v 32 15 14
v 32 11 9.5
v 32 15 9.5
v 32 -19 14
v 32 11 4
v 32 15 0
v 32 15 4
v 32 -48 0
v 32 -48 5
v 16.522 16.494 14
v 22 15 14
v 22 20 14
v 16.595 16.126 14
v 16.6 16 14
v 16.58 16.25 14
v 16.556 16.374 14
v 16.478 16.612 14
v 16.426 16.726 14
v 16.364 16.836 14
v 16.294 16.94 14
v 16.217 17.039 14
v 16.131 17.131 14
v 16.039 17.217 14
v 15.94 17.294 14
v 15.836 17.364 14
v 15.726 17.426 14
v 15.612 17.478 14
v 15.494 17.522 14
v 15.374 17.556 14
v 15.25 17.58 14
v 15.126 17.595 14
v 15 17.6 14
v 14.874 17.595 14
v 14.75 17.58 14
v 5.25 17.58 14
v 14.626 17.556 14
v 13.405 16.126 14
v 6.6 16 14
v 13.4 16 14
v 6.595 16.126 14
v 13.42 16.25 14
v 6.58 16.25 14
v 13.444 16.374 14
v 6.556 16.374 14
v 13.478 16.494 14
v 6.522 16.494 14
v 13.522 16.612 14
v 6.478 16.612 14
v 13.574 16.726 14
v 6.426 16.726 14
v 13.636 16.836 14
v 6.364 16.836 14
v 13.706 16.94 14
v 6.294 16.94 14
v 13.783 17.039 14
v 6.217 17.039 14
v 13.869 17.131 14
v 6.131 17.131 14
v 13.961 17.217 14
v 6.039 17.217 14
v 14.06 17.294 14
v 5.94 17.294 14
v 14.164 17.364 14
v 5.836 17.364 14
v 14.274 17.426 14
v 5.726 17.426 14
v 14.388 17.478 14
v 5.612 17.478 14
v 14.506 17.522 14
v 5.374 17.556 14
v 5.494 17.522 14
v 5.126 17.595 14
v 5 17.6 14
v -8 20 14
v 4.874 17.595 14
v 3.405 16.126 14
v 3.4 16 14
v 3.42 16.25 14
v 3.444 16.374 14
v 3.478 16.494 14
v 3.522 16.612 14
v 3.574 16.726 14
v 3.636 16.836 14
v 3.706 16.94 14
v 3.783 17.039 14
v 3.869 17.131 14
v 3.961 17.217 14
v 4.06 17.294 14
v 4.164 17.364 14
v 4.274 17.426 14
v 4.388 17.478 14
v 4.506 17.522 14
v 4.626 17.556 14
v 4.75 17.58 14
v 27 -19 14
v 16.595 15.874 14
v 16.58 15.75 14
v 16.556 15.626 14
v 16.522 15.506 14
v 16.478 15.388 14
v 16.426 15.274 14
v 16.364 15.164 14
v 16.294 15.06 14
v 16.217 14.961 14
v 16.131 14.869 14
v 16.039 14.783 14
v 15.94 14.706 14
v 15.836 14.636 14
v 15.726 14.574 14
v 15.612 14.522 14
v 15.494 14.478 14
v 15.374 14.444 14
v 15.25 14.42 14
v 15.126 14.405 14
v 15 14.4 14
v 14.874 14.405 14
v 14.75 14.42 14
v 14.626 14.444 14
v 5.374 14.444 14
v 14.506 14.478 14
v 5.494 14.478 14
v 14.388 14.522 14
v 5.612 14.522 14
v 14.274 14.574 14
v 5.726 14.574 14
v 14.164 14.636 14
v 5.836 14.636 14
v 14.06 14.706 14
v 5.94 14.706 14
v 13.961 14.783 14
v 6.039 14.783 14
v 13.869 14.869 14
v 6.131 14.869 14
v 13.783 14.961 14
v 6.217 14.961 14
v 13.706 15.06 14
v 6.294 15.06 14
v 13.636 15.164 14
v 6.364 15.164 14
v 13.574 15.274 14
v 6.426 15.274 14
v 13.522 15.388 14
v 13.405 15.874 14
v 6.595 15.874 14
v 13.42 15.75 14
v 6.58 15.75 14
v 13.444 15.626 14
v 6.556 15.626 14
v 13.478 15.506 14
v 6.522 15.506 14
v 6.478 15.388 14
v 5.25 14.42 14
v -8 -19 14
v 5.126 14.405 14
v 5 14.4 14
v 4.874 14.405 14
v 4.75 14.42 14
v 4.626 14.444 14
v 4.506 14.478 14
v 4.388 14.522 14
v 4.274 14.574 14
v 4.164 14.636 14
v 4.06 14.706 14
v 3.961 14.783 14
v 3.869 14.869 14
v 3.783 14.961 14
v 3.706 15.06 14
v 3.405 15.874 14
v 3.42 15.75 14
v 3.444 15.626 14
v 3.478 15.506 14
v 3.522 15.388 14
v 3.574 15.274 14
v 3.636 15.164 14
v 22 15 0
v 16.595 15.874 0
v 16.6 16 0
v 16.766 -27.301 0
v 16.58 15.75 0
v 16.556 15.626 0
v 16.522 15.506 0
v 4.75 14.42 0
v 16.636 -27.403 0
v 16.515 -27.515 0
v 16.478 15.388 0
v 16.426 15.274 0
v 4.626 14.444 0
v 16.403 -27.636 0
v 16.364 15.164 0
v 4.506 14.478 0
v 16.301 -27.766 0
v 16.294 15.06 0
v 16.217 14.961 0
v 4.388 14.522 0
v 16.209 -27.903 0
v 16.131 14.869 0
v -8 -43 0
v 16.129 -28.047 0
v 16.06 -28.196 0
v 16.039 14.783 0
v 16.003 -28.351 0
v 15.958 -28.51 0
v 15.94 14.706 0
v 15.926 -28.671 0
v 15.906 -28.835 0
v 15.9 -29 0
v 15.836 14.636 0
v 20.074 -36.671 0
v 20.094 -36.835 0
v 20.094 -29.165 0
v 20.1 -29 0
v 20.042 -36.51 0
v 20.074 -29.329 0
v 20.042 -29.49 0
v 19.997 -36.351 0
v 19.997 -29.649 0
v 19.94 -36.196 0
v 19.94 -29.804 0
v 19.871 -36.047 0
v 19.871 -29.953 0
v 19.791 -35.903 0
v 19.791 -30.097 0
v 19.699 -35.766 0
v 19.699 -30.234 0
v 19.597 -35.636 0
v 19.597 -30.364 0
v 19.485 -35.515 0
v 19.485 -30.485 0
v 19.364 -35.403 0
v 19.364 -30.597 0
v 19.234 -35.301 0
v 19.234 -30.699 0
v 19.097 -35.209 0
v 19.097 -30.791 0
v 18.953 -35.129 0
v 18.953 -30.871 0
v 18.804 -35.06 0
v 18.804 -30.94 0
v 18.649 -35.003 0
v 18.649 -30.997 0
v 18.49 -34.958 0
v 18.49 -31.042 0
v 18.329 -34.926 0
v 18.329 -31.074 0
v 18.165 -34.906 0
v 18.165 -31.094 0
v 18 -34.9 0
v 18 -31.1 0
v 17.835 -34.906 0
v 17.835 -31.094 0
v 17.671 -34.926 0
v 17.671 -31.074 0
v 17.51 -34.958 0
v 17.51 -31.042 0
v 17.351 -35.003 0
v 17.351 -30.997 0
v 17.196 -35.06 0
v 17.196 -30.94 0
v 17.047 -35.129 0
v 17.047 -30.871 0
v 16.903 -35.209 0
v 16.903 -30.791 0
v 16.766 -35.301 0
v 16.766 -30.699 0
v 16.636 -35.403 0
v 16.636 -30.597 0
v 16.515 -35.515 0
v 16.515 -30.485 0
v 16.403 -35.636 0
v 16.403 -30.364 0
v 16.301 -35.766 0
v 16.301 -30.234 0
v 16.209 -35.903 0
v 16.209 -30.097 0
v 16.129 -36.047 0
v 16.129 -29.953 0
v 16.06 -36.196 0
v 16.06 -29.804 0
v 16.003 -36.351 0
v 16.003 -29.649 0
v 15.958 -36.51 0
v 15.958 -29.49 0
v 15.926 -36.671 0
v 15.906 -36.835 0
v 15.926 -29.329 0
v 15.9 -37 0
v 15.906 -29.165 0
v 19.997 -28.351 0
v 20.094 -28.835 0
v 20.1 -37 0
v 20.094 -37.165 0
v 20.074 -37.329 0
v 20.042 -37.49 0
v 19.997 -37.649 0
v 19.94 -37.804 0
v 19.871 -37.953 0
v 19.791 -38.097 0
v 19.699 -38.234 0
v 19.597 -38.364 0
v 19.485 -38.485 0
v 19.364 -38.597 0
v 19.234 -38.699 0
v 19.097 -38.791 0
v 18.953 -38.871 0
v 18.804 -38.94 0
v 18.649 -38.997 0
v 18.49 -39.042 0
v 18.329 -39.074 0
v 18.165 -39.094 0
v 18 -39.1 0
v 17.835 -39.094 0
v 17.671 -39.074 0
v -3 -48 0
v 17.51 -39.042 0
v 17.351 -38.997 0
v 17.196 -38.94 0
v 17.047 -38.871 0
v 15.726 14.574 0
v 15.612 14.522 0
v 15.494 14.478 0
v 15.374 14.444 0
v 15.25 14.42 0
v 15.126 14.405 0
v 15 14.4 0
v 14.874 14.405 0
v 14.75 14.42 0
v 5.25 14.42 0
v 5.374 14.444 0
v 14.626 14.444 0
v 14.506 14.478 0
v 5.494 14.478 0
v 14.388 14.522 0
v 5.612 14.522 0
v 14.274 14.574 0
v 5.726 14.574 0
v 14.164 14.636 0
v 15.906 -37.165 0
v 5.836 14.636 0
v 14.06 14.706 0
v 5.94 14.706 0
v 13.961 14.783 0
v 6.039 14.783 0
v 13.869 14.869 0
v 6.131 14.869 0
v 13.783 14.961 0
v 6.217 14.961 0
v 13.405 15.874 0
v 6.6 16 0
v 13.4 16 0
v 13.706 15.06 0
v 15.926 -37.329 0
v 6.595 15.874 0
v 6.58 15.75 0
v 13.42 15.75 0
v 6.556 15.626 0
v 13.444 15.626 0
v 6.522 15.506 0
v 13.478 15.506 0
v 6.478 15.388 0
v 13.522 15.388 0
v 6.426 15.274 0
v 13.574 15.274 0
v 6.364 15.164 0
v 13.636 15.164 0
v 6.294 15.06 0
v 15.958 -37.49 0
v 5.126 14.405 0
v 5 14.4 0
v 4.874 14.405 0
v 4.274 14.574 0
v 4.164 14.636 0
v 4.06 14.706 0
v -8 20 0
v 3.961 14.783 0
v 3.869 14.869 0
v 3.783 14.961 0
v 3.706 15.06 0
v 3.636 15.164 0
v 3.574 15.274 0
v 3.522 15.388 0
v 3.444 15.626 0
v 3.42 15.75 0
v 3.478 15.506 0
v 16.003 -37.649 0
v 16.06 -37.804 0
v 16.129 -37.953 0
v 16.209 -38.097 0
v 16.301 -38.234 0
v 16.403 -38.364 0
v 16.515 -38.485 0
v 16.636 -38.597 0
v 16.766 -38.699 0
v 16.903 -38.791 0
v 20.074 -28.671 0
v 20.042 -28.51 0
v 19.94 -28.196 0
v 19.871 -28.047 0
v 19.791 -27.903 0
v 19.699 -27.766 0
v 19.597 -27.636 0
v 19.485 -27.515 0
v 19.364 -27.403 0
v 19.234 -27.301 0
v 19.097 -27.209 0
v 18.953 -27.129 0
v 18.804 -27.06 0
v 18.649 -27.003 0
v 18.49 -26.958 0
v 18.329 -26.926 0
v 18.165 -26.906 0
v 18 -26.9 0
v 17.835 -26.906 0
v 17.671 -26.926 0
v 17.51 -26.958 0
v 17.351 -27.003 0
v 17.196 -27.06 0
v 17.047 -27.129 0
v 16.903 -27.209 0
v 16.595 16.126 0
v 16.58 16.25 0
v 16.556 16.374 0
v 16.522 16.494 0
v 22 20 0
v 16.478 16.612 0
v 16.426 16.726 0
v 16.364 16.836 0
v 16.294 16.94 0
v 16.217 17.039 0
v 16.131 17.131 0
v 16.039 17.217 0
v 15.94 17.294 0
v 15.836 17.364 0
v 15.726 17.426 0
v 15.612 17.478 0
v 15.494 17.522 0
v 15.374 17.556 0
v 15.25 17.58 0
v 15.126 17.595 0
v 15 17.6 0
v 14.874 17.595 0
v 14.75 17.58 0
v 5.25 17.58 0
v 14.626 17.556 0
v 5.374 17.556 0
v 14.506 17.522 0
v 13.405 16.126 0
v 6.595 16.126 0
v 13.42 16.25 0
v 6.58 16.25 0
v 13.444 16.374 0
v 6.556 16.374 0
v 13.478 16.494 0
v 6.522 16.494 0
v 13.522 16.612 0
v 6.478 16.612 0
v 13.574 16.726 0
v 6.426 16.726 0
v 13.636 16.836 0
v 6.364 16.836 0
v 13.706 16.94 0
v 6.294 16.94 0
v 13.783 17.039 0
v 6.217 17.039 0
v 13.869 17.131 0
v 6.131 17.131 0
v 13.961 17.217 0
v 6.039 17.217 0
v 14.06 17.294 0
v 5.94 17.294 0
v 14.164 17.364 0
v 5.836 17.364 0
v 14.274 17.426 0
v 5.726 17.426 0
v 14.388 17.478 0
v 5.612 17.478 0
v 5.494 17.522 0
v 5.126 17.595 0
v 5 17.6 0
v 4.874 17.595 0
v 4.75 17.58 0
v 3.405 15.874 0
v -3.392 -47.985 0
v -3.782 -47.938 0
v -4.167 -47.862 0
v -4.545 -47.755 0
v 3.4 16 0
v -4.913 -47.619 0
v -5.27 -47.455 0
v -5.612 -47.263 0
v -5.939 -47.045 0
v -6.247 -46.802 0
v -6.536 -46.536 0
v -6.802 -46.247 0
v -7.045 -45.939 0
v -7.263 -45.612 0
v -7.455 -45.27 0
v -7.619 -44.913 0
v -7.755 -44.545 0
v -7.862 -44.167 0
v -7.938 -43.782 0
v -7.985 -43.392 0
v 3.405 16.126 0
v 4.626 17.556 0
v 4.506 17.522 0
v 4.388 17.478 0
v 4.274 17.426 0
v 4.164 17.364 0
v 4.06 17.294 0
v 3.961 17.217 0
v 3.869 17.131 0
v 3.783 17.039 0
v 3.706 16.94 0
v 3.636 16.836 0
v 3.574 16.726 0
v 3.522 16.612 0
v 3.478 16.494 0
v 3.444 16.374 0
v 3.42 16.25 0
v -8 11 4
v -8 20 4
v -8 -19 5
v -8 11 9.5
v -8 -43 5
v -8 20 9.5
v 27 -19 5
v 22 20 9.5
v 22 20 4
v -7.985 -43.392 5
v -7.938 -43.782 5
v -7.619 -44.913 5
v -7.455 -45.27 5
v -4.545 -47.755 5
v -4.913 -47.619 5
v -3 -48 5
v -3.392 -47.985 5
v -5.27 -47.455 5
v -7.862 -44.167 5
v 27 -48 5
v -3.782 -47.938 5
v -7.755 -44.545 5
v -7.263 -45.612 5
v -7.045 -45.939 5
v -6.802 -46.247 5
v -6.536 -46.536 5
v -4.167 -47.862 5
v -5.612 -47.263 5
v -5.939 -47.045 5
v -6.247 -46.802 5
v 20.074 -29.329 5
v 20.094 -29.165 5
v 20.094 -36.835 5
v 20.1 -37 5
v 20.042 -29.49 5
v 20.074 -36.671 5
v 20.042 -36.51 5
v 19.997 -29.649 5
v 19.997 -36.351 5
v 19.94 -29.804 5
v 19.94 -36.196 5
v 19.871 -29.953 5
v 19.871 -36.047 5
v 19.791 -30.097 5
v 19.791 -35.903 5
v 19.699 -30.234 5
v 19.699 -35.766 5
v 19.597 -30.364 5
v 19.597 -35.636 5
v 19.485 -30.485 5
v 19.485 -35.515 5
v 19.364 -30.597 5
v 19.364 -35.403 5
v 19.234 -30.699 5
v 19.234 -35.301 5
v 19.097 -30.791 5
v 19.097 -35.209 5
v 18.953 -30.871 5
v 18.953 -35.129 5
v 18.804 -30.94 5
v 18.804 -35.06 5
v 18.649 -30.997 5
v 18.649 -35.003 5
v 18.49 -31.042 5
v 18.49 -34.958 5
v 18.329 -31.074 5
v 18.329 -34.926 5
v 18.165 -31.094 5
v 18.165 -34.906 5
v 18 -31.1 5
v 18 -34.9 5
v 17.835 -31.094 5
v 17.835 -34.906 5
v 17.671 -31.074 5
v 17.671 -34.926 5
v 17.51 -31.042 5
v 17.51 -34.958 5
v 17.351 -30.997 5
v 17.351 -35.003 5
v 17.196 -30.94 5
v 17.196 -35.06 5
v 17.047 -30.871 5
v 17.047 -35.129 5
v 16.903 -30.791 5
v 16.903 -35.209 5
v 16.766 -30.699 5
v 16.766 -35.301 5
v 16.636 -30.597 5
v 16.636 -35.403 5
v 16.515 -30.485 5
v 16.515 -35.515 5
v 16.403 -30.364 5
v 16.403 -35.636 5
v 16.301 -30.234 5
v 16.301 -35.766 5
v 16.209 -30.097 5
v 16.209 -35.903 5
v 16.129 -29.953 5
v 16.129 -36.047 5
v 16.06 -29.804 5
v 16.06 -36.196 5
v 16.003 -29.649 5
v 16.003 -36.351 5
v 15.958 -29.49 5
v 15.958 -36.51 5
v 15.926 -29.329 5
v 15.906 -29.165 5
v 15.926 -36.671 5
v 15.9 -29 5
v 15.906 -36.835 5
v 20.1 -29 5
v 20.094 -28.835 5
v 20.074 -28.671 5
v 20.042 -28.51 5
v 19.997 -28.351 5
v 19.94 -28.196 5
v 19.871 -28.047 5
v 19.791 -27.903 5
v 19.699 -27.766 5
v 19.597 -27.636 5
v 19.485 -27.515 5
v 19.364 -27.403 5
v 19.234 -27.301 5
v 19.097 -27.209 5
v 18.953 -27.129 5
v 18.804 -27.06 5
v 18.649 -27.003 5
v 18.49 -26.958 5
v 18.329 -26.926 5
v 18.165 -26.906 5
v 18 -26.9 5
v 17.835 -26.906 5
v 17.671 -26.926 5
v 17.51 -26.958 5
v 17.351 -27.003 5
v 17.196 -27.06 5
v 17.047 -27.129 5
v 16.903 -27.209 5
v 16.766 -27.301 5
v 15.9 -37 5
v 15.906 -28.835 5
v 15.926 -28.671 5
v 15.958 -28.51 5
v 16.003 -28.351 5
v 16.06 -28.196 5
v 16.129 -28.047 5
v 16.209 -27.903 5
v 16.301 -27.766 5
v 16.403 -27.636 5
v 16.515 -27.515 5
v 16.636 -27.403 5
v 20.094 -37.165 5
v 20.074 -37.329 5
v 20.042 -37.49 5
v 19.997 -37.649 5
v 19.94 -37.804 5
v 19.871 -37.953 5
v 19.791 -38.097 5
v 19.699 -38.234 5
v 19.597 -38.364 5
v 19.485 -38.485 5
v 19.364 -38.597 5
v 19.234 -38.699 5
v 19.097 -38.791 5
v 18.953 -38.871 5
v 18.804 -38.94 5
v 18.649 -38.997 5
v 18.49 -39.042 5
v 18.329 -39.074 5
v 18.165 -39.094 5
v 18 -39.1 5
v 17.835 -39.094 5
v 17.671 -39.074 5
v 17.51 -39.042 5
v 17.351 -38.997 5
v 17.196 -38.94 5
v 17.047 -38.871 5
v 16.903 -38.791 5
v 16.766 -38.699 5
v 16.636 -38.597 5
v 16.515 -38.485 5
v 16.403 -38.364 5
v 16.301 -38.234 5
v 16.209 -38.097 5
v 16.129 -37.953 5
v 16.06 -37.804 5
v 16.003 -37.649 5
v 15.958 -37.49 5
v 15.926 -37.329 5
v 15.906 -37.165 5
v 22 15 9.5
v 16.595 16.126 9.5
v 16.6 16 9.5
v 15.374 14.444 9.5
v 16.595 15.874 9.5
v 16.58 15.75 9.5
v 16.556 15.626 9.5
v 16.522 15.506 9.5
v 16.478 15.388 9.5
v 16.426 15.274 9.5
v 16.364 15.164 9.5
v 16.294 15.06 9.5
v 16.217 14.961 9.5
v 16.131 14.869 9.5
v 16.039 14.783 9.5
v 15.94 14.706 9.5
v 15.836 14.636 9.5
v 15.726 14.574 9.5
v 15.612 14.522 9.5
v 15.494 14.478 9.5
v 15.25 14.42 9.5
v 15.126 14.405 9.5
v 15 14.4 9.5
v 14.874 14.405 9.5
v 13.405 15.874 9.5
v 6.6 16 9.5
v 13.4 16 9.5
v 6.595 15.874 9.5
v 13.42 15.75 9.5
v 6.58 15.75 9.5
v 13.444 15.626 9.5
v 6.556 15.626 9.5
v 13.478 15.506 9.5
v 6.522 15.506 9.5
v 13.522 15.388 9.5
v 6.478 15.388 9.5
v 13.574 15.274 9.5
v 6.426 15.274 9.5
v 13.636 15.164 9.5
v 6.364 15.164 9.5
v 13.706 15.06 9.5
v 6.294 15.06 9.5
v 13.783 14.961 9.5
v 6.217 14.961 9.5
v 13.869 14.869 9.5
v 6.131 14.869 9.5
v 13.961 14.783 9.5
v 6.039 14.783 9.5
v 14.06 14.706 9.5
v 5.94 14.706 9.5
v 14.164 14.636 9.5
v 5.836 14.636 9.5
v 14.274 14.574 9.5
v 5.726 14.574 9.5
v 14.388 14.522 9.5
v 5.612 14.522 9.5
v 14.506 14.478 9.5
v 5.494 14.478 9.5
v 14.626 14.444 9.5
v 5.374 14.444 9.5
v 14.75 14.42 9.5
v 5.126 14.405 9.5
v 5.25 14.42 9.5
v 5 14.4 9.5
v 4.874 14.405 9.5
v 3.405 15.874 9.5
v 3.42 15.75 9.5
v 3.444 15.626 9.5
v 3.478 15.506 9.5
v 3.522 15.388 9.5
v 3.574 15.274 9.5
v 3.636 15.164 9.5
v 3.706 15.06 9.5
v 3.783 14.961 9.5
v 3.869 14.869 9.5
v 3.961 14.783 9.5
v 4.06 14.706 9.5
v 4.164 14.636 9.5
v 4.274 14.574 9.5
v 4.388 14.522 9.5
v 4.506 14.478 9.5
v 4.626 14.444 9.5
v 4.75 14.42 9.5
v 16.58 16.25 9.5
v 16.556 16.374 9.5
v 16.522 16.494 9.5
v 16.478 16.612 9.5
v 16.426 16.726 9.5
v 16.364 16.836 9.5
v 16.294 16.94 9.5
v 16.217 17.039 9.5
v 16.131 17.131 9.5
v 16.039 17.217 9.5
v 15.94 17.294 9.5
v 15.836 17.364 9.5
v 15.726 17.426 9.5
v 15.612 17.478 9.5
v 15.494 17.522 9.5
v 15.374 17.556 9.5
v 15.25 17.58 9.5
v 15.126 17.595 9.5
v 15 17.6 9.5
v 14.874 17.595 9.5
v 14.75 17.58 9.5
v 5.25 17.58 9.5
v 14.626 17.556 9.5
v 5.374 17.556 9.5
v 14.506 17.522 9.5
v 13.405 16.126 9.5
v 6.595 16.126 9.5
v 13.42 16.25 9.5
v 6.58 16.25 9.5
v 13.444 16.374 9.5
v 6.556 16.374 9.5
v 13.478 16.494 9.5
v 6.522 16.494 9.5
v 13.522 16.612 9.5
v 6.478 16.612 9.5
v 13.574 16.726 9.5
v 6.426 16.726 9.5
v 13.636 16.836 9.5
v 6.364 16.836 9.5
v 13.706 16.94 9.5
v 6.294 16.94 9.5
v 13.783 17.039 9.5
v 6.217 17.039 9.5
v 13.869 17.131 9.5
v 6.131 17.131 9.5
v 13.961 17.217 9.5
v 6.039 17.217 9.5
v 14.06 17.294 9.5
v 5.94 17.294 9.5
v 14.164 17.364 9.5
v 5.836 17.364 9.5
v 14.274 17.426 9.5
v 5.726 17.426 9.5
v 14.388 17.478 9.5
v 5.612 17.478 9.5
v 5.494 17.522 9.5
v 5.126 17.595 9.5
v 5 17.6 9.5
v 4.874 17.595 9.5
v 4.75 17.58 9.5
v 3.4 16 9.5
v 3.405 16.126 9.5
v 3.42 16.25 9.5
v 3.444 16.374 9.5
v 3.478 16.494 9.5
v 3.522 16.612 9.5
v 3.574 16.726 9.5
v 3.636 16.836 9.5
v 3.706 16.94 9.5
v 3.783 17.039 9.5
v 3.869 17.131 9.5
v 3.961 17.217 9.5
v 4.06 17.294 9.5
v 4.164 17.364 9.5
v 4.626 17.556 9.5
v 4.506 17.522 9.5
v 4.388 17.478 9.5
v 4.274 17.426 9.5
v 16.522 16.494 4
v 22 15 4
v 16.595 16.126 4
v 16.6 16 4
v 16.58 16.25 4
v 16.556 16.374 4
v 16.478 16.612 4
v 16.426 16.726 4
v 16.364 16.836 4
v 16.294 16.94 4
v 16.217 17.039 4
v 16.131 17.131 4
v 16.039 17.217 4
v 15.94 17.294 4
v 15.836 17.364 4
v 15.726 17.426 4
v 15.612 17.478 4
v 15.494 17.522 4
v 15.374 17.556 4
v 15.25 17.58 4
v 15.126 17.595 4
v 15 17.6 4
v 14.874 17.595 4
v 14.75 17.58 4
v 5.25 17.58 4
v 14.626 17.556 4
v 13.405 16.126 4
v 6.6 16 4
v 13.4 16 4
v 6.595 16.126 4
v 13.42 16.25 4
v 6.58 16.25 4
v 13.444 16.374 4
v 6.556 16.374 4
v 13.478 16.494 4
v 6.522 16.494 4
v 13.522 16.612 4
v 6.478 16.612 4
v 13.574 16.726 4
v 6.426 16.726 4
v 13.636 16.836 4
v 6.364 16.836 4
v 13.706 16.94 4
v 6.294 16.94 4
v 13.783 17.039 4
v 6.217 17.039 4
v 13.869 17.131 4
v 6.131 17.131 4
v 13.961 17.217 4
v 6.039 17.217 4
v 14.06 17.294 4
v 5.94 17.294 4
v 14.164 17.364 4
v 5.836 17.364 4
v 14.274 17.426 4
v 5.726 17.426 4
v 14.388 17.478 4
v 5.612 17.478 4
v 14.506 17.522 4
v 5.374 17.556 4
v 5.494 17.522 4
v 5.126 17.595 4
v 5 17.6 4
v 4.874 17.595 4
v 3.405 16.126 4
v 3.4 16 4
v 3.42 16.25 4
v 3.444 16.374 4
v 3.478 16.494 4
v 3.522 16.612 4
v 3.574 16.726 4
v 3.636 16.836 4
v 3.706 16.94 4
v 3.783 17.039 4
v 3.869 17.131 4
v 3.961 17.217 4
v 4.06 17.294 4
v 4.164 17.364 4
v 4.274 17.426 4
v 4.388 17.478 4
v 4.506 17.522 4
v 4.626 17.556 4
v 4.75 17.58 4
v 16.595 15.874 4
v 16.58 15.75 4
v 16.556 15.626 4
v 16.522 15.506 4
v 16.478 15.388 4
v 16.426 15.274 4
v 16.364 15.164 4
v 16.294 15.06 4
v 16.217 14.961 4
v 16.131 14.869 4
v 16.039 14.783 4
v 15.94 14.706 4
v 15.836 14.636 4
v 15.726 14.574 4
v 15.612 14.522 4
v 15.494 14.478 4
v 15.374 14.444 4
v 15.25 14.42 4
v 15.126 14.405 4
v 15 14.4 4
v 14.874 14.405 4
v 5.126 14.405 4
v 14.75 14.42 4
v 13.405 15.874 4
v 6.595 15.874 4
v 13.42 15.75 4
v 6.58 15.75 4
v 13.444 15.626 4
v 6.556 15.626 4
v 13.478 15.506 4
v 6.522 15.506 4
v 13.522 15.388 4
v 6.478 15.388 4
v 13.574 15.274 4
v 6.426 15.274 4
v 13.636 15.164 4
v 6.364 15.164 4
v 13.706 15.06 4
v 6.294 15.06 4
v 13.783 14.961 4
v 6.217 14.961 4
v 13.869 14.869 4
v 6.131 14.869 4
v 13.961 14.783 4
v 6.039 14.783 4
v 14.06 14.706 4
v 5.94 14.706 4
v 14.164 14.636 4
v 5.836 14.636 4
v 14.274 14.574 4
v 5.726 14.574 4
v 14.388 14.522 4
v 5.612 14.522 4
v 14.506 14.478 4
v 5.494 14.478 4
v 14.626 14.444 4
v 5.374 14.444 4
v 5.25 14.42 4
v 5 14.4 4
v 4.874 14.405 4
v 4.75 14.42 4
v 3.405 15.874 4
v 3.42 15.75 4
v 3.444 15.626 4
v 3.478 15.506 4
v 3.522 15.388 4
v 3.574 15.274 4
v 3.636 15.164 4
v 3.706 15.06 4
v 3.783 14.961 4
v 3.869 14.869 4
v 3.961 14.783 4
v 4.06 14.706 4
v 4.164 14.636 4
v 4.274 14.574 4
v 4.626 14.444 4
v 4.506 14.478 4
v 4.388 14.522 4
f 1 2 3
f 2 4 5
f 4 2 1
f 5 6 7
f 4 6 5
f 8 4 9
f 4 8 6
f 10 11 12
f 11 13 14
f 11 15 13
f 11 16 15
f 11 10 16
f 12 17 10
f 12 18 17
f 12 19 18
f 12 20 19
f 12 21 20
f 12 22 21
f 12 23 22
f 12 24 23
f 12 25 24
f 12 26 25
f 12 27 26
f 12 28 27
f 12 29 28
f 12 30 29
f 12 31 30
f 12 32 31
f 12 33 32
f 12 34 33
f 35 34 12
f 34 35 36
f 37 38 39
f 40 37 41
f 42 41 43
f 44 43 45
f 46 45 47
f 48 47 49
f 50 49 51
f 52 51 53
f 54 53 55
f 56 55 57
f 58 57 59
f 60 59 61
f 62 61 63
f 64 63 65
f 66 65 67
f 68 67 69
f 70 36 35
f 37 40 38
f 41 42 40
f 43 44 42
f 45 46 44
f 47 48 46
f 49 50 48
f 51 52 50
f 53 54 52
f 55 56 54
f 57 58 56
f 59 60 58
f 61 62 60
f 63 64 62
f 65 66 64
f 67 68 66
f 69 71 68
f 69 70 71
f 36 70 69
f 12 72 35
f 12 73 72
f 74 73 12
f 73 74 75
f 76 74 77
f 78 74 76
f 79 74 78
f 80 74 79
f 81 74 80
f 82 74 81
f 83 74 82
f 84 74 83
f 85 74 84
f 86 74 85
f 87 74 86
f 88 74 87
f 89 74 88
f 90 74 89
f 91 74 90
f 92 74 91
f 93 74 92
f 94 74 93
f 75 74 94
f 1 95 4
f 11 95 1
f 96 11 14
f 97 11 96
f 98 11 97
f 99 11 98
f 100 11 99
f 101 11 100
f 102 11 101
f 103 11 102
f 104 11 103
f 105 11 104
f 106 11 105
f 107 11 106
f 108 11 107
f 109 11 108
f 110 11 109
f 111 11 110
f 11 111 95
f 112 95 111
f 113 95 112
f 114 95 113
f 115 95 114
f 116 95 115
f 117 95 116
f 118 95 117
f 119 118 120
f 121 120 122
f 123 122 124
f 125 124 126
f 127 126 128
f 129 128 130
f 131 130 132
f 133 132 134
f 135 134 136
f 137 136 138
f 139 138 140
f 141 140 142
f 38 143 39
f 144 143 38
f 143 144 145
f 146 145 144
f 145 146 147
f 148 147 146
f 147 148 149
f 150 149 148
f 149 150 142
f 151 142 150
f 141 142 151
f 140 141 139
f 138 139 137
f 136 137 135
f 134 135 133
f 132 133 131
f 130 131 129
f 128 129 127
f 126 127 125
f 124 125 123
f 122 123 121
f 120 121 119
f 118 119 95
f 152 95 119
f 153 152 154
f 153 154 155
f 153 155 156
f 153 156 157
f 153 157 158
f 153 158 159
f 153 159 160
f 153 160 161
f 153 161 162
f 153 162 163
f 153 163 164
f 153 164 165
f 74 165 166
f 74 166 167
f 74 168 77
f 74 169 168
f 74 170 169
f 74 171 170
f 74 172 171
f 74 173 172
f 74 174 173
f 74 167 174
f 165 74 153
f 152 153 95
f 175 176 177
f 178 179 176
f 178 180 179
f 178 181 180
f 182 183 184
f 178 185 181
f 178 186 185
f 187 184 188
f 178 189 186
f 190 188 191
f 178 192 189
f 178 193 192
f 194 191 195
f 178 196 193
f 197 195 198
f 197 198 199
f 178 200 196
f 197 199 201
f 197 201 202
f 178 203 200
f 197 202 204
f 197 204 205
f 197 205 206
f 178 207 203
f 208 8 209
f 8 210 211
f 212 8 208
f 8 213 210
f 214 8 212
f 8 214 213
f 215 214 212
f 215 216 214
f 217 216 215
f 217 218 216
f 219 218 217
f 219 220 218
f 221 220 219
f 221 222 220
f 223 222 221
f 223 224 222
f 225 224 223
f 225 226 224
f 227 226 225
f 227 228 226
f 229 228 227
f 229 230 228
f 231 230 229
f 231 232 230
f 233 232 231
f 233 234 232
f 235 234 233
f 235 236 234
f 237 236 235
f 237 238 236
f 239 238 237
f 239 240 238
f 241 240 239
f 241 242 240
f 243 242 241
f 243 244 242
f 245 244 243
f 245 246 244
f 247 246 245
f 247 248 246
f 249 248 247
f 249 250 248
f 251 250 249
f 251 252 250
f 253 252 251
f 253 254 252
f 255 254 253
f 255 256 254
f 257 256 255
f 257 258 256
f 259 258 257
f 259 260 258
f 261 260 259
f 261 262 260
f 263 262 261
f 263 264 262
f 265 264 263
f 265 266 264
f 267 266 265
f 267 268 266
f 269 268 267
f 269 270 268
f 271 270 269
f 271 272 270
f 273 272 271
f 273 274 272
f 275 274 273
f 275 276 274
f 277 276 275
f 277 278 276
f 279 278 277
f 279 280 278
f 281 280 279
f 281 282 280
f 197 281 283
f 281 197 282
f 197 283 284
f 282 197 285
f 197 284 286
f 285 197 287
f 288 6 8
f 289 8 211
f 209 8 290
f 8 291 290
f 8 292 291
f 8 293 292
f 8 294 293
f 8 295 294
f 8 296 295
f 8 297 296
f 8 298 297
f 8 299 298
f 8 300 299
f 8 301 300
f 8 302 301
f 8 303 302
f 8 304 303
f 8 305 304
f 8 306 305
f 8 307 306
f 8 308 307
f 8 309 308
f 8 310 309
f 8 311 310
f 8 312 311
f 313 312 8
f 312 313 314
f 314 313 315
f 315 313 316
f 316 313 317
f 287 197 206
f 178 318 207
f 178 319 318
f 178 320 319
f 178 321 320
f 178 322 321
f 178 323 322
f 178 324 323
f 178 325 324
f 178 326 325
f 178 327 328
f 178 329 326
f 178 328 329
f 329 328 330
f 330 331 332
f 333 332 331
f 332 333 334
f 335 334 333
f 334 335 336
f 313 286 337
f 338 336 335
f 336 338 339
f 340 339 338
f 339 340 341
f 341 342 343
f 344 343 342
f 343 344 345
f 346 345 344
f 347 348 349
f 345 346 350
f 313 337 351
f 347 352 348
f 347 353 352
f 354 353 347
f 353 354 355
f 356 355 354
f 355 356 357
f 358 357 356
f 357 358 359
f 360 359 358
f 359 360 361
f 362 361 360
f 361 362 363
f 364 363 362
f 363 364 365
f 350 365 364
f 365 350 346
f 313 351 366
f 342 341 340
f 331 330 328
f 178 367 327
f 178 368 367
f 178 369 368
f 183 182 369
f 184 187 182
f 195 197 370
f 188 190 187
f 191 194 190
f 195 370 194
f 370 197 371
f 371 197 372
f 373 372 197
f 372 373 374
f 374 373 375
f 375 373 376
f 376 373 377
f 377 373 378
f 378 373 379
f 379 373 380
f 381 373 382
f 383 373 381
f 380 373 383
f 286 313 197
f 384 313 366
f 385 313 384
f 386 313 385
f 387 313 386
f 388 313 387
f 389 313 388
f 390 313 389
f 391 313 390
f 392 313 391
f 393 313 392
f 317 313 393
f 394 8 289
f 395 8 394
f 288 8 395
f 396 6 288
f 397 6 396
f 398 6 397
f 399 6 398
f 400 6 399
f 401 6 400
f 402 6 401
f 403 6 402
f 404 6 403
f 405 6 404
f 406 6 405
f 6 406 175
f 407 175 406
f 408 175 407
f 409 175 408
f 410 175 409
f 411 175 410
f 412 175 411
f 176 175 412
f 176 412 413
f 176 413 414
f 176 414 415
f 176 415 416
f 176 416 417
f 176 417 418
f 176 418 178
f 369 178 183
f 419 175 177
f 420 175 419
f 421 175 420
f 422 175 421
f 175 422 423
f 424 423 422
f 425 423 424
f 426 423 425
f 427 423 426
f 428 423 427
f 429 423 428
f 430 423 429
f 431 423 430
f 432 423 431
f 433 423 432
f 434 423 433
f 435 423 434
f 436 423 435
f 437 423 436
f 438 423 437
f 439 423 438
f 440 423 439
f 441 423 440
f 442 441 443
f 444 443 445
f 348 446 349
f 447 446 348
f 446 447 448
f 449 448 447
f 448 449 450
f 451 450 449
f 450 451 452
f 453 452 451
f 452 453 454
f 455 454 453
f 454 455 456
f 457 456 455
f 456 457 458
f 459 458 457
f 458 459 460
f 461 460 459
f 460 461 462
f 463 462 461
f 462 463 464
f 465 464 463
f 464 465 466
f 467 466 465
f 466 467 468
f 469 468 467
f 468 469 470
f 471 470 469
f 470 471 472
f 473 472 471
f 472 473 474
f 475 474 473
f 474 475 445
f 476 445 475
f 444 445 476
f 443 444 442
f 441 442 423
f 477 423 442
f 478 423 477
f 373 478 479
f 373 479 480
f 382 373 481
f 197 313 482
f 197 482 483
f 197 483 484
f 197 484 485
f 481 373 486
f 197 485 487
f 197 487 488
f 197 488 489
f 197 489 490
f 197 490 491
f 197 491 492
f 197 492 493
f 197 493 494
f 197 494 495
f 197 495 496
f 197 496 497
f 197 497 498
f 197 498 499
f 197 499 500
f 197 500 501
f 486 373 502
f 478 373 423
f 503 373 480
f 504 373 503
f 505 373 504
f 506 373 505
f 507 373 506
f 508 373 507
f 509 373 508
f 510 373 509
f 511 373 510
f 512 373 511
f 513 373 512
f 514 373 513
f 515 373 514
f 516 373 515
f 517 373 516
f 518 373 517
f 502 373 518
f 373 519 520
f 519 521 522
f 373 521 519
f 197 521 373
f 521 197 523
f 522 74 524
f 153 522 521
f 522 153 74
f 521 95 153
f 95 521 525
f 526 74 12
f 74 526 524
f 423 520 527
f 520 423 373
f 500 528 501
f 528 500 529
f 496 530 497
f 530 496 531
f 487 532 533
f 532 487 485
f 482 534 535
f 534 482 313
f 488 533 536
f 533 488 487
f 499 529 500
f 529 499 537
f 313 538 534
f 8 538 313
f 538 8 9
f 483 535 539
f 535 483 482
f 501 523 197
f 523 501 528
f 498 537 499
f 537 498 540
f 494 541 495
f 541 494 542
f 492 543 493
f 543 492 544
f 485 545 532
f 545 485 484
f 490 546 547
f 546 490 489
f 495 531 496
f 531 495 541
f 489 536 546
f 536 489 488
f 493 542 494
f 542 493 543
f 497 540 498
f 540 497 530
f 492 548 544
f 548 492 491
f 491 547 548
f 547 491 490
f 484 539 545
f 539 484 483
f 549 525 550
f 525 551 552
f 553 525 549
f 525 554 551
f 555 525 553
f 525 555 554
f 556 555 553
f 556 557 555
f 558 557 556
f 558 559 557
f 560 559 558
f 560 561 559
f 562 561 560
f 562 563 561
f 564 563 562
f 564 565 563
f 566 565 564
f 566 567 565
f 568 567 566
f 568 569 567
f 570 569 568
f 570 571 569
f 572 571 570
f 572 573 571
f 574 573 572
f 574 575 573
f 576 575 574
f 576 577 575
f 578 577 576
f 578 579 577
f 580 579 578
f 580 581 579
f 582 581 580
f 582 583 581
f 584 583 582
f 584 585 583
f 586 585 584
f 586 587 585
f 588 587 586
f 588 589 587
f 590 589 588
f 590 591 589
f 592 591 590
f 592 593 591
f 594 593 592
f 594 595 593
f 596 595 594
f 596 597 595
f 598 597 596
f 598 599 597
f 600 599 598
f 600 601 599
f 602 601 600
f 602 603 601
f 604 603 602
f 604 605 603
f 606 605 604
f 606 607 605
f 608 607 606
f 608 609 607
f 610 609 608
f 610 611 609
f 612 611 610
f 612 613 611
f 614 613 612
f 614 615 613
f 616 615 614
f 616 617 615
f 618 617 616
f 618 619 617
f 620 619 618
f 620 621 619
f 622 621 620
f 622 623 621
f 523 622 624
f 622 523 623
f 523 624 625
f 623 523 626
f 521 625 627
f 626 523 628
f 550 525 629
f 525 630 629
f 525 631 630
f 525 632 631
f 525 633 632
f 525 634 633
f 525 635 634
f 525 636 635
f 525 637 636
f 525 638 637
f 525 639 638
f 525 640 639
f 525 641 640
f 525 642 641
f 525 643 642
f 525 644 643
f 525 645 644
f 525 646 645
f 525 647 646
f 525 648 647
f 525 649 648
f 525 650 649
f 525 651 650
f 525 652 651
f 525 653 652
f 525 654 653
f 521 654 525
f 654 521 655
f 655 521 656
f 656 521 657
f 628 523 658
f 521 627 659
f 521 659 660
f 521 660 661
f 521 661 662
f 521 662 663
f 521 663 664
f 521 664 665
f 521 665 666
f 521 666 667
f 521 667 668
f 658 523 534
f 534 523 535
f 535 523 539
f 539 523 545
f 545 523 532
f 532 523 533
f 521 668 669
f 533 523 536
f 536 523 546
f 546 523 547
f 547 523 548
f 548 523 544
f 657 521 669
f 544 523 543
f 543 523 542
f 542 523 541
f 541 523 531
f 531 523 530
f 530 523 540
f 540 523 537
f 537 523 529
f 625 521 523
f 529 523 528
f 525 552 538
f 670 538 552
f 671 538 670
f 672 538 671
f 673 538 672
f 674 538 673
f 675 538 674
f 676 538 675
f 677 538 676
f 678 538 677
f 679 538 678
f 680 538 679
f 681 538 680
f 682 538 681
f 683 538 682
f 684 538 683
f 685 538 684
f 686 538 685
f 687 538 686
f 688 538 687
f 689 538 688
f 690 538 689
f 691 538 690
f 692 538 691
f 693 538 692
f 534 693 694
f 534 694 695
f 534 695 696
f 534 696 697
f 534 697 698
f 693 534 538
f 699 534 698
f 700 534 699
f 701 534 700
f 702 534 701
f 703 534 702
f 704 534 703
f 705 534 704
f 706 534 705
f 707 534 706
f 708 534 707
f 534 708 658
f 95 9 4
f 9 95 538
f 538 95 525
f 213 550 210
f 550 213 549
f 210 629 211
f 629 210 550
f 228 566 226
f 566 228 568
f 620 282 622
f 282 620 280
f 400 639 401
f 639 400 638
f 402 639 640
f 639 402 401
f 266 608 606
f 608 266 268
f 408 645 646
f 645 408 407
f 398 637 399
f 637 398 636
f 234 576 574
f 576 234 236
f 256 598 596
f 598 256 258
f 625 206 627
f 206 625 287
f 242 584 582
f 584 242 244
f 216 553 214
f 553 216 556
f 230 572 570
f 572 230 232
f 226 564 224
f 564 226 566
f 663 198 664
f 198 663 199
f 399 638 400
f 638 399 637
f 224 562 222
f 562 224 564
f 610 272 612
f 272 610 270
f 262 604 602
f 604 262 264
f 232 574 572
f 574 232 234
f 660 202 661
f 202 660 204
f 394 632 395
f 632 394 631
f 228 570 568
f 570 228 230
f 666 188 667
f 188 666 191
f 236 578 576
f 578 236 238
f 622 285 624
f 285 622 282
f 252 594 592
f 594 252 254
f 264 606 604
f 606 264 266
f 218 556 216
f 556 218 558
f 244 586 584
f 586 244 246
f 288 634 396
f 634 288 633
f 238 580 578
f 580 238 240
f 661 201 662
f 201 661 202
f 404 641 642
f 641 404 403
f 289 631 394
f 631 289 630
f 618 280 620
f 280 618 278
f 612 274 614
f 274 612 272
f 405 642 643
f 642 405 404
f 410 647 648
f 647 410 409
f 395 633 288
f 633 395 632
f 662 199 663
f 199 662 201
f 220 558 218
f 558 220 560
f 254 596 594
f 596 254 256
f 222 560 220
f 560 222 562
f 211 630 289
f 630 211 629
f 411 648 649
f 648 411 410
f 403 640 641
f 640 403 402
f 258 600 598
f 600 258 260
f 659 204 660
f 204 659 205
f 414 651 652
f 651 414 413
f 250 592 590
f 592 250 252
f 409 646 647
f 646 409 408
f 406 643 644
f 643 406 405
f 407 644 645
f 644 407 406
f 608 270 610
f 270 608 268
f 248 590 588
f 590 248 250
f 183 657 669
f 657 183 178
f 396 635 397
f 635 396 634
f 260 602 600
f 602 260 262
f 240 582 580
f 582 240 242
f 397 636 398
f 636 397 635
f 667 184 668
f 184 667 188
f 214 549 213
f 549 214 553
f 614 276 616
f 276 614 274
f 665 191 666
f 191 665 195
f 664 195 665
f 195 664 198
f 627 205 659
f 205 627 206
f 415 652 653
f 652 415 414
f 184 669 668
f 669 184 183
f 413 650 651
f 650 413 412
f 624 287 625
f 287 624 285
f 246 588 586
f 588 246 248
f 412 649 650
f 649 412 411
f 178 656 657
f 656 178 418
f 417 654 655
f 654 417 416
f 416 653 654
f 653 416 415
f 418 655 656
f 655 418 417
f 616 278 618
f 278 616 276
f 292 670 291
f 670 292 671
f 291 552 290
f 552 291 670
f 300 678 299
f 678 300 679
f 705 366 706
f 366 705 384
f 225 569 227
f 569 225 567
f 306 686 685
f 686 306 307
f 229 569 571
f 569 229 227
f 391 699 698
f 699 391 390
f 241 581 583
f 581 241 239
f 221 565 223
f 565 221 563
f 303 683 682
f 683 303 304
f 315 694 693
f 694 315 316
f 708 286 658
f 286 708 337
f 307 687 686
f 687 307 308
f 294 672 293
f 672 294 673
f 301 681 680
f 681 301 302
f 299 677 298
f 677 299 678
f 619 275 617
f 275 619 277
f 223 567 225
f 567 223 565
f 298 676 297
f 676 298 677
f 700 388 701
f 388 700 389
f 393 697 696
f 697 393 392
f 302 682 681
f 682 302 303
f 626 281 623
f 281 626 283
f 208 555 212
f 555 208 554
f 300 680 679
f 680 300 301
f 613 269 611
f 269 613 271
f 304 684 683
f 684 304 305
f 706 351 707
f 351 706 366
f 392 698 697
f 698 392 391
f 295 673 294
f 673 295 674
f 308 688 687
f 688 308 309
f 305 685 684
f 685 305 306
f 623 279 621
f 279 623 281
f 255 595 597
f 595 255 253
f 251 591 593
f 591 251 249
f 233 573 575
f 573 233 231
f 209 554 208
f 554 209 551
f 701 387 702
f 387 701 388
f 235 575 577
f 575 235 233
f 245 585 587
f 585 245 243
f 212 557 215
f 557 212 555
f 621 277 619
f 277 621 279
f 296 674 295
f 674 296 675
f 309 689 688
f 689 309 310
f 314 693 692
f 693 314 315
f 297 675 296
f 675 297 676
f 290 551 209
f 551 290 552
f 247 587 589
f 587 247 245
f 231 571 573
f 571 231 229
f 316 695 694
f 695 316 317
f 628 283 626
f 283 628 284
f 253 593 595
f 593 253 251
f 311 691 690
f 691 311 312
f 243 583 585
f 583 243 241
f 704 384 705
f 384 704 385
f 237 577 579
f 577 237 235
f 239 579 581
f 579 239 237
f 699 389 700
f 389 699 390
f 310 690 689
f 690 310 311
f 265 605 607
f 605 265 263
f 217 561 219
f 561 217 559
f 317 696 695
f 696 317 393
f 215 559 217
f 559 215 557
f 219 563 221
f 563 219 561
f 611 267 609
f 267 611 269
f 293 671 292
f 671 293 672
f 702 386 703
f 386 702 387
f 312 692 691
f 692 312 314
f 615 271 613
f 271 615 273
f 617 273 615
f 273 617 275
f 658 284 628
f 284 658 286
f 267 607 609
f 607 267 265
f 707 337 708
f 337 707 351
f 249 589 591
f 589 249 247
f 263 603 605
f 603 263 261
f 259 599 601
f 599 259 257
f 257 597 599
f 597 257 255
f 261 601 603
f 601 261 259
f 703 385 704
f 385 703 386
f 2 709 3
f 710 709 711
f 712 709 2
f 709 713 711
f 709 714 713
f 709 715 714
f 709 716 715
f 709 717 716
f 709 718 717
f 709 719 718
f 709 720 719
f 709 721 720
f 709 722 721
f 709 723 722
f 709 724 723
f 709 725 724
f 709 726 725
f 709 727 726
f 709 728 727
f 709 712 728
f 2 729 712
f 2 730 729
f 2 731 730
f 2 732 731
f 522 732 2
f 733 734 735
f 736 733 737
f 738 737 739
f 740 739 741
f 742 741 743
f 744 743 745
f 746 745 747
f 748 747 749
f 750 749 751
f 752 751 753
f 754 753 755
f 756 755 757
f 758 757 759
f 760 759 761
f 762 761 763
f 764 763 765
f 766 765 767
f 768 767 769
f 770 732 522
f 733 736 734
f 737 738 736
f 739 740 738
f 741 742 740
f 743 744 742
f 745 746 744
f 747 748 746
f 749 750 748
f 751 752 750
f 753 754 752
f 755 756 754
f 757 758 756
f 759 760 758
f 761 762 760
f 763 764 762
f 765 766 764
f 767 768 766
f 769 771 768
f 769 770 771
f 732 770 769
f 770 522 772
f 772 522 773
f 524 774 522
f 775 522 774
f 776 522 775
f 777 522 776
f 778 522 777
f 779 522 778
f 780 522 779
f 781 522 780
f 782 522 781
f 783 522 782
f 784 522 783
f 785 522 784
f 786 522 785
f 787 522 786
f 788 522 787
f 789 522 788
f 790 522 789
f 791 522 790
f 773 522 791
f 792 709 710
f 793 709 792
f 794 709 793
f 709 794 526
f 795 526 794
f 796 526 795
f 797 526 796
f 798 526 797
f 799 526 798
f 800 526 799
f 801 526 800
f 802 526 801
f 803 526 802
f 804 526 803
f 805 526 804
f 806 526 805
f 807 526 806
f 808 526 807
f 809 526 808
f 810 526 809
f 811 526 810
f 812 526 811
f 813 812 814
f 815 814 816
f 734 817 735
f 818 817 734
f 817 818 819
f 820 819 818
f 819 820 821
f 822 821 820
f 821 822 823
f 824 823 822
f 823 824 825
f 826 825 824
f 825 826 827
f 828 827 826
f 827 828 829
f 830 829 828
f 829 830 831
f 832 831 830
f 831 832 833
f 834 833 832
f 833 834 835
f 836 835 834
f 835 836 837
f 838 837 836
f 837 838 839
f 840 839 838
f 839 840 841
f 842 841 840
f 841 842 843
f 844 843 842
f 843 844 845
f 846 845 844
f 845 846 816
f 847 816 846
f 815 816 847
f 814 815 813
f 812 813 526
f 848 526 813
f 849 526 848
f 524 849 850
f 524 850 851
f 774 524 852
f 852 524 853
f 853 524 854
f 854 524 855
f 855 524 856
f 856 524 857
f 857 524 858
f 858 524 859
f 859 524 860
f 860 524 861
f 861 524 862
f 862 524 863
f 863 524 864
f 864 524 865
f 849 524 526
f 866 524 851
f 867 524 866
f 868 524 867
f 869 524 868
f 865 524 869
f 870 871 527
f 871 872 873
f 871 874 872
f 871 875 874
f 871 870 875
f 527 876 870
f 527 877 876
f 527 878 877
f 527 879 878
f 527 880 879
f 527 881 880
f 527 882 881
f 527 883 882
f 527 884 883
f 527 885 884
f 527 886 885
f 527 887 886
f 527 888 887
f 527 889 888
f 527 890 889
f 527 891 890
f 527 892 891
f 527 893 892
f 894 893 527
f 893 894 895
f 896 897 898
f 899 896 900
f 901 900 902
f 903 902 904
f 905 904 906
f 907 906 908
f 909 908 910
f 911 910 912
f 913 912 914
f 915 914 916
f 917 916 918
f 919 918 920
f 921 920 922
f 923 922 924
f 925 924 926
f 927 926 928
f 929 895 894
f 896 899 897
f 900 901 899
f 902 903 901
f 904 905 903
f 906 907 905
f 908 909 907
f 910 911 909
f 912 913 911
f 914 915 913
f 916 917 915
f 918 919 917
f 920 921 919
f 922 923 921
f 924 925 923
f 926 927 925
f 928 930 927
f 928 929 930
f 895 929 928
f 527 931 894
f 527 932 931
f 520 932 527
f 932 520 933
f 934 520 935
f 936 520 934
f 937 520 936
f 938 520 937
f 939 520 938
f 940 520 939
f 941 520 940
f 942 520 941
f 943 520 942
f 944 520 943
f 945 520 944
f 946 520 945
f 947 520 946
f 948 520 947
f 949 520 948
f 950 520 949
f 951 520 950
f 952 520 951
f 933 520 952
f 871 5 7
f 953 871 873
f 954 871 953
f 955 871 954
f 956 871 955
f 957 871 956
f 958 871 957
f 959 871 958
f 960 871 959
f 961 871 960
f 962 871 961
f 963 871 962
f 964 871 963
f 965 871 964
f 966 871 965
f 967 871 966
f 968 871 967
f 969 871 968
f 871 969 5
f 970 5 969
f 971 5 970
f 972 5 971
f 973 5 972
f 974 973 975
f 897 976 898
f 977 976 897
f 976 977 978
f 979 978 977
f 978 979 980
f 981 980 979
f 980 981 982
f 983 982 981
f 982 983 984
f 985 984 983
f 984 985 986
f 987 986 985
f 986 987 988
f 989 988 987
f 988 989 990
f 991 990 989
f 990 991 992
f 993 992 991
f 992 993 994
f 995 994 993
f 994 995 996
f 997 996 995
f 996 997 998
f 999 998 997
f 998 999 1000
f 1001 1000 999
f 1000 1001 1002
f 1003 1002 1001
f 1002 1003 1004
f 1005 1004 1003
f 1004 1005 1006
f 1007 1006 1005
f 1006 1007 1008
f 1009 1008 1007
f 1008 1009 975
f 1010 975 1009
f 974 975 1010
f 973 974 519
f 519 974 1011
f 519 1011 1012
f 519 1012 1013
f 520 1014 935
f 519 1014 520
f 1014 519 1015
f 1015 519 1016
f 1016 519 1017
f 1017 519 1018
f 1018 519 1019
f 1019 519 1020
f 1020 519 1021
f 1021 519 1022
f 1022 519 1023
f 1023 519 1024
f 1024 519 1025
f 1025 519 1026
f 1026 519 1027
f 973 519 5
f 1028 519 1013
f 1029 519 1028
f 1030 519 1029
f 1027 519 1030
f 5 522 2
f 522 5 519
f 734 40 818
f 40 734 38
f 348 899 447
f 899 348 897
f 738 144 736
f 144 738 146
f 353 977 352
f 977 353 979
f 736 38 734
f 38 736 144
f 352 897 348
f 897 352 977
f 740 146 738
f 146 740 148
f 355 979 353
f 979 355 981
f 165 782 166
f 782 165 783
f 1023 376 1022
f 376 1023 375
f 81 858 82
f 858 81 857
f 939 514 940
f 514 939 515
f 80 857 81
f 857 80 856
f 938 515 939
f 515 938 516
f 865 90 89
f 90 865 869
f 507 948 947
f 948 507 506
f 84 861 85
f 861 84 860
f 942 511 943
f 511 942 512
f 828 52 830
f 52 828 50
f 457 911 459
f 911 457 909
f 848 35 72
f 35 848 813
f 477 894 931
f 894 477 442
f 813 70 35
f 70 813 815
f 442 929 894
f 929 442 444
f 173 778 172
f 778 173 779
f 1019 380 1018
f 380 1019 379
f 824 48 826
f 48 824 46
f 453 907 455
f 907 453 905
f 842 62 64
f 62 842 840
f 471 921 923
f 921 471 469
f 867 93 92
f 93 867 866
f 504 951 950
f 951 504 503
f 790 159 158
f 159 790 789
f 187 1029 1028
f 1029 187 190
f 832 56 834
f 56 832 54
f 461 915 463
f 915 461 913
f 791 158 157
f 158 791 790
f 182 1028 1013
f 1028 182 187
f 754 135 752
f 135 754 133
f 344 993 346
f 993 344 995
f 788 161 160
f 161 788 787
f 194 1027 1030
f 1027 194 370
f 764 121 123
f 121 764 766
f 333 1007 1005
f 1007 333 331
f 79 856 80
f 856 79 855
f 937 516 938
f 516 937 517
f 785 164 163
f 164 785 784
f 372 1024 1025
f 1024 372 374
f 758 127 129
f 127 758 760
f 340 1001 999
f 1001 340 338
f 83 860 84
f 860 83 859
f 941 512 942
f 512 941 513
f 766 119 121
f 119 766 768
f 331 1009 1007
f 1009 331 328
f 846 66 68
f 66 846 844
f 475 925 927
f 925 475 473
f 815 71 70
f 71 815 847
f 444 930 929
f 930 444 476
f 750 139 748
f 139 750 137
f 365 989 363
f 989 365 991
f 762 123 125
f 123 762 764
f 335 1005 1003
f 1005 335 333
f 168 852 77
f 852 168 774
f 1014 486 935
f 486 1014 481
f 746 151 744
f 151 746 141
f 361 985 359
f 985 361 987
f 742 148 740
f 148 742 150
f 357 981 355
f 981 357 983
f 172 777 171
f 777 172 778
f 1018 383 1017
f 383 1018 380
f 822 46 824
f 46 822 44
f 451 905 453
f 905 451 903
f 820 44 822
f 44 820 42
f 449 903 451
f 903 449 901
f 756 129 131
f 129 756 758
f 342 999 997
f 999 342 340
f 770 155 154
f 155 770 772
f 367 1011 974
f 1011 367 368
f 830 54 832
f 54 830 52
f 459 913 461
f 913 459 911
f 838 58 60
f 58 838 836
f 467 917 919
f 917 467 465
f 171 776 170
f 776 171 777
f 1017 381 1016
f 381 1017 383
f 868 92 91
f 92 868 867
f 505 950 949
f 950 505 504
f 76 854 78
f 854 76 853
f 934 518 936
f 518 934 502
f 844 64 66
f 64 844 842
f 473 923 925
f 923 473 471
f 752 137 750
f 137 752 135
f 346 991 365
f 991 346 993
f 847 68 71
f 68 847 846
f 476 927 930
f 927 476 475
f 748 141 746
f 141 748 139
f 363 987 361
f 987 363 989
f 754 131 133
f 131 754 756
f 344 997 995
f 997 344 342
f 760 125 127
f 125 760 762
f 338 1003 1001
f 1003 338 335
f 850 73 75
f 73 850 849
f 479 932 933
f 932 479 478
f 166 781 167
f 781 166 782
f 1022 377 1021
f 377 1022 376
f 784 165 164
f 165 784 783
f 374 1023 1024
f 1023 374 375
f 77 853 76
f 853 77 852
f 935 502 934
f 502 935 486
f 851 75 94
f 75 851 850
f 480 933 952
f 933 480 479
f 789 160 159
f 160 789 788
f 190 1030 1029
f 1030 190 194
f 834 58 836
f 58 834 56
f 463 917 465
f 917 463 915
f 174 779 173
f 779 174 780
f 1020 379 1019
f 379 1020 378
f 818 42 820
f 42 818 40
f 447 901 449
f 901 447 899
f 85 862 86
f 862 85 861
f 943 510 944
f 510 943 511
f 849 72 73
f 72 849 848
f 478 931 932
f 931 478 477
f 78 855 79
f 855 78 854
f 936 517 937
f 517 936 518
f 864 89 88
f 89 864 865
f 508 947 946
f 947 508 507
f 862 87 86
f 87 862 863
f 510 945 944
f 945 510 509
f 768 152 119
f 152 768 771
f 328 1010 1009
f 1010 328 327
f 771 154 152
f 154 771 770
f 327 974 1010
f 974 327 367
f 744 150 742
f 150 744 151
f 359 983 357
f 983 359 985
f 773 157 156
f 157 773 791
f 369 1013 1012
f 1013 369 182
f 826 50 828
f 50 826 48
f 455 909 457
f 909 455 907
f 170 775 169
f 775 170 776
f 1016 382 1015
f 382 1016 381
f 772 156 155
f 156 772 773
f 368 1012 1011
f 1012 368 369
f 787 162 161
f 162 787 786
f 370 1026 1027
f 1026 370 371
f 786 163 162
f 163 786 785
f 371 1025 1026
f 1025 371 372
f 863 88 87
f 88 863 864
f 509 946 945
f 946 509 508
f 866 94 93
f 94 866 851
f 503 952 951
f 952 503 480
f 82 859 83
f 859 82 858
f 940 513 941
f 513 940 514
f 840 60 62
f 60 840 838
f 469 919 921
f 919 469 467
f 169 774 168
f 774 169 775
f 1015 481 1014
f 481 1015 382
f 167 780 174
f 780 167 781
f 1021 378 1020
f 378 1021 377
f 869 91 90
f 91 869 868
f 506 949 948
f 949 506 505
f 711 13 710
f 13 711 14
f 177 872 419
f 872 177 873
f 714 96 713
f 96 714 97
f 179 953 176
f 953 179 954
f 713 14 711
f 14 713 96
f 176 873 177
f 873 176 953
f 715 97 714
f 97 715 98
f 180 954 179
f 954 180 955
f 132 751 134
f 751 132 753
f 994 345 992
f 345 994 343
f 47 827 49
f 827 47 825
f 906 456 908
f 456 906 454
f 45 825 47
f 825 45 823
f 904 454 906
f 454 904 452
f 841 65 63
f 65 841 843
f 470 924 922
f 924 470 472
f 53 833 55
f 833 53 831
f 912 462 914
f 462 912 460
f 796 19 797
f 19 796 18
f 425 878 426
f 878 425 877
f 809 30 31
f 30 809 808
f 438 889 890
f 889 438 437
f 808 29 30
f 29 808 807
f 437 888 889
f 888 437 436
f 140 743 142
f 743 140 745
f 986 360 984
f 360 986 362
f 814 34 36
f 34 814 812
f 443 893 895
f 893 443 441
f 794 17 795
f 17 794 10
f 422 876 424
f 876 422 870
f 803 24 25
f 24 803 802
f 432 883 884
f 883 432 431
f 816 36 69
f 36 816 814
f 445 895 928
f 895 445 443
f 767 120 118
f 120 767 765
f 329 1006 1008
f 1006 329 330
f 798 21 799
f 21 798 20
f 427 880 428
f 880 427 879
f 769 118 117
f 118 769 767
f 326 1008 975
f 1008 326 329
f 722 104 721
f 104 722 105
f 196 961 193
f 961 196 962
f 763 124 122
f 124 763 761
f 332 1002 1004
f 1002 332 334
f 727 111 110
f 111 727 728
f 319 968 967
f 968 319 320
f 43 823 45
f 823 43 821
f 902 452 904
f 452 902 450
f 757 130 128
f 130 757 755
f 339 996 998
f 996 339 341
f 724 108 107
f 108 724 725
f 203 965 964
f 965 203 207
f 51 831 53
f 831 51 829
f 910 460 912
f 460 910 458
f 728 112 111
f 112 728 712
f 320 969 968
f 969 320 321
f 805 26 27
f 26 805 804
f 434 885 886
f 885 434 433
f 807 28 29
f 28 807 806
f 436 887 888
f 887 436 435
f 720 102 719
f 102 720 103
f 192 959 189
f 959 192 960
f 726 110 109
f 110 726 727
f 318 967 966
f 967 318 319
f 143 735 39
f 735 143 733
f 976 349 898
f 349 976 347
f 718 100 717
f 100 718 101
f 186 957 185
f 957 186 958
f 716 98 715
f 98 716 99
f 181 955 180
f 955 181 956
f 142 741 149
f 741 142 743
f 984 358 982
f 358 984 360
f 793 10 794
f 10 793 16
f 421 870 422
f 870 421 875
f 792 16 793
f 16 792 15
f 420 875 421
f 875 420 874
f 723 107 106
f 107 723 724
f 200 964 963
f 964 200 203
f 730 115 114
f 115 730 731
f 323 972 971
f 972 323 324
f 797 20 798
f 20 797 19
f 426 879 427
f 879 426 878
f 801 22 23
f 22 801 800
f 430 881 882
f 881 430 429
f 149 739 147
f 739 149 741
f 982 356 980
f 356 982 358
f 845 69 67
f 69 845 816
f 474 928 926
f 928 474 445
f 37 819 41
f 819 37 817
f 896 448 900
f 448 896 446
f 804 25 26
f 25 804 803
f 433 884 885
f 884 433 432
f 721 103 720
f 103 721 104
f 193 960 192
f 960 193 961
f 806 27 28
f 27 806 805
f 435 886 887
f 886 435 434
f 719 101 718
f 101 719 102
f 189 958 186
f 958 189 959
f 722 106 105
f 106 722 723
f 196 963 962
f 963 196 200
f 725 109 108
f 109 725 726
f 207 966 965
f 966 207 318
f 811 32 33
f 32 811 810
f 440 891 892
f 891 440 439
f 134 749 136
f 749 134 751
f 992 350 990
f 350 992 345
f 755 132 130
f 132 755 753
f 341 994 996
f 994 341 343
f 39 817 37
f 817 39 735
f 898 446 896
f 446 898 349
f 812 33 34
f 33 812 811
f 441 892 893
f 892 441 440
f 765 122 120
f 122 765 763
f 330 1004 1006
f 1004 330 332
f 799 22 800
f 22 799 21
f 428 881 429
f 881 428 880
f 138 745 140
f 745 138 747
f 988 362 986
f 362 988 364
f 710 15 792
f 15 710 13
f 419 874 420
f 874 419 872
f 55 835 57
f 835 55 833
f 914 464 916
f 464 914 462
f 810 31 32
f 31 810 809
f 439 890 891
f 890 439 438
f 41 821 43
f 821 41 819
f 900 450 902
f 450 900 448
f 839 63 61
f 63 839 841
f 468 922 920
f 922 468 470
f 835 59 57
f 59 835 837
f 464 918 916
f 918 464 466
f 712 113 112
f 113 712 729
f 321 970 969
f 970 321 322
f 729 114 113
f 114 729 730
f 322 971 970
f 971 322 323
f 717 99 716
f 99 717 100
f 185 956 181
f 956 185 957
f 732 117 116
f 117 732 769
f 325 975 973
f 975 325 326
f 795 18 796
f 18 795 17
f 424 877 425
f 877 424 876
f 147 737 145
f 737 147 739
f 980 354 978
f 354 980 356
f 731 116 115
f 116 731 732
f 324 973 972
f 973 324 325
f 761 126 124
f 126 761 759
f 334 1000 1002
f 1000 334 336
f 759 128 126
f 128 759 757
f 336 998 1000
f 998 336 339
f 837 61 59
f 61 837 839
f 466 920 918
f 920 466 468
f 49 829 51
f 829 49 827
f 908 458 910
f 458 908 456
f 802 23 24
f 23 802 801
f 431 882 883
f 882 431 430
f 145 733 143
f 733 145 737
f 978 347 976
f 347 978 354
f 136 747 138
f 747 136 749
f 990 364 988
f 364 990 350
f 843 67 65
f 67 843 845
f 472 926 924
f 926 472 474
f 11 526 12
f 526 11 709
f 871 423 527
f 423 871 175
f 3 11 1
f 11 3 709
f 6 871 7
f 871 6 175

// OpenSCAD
$fn=80;
thick=14;

new();

module new() {
   mirror([0,1,0]) difference() {
      union() {
         translate([-8,-20,0]) cube([40,39,thick]);
         hull() {
            translate([-8+20,0,0]) cube([20, 48, 5]);
            translate([-8,0,0]) cube([20, 31,5]);
            translate([-3,43,0]) cylinder(h=5,r=5);
         }

         translate([27,0,0]) rotate([90,0,90]) linear_extrude(height=5)
            polygon(points=[[19,0], [19,thick],[48,5], [48,0]]);
      }

      // translate([18,23,-0.5]) cylinder(d=4.2,h=10);
      translate([18,29,-0.5]) cylinder(d=4.2,h=10);
      translate([18,37,-0.5]) cylinder(d=4.2,h=10);

      // cutout for carriage wall
      translate([-9,-21,4]) cube([50,10,5.5]);

      translate([5,4-20,-1]) cylinder(d=3.2,h=20);
      translate([15,4-20,-1]) cylinder(d=3.2,h=20);

      translate([22,-25,-1]) cube([15,10,20]);
   }
}
